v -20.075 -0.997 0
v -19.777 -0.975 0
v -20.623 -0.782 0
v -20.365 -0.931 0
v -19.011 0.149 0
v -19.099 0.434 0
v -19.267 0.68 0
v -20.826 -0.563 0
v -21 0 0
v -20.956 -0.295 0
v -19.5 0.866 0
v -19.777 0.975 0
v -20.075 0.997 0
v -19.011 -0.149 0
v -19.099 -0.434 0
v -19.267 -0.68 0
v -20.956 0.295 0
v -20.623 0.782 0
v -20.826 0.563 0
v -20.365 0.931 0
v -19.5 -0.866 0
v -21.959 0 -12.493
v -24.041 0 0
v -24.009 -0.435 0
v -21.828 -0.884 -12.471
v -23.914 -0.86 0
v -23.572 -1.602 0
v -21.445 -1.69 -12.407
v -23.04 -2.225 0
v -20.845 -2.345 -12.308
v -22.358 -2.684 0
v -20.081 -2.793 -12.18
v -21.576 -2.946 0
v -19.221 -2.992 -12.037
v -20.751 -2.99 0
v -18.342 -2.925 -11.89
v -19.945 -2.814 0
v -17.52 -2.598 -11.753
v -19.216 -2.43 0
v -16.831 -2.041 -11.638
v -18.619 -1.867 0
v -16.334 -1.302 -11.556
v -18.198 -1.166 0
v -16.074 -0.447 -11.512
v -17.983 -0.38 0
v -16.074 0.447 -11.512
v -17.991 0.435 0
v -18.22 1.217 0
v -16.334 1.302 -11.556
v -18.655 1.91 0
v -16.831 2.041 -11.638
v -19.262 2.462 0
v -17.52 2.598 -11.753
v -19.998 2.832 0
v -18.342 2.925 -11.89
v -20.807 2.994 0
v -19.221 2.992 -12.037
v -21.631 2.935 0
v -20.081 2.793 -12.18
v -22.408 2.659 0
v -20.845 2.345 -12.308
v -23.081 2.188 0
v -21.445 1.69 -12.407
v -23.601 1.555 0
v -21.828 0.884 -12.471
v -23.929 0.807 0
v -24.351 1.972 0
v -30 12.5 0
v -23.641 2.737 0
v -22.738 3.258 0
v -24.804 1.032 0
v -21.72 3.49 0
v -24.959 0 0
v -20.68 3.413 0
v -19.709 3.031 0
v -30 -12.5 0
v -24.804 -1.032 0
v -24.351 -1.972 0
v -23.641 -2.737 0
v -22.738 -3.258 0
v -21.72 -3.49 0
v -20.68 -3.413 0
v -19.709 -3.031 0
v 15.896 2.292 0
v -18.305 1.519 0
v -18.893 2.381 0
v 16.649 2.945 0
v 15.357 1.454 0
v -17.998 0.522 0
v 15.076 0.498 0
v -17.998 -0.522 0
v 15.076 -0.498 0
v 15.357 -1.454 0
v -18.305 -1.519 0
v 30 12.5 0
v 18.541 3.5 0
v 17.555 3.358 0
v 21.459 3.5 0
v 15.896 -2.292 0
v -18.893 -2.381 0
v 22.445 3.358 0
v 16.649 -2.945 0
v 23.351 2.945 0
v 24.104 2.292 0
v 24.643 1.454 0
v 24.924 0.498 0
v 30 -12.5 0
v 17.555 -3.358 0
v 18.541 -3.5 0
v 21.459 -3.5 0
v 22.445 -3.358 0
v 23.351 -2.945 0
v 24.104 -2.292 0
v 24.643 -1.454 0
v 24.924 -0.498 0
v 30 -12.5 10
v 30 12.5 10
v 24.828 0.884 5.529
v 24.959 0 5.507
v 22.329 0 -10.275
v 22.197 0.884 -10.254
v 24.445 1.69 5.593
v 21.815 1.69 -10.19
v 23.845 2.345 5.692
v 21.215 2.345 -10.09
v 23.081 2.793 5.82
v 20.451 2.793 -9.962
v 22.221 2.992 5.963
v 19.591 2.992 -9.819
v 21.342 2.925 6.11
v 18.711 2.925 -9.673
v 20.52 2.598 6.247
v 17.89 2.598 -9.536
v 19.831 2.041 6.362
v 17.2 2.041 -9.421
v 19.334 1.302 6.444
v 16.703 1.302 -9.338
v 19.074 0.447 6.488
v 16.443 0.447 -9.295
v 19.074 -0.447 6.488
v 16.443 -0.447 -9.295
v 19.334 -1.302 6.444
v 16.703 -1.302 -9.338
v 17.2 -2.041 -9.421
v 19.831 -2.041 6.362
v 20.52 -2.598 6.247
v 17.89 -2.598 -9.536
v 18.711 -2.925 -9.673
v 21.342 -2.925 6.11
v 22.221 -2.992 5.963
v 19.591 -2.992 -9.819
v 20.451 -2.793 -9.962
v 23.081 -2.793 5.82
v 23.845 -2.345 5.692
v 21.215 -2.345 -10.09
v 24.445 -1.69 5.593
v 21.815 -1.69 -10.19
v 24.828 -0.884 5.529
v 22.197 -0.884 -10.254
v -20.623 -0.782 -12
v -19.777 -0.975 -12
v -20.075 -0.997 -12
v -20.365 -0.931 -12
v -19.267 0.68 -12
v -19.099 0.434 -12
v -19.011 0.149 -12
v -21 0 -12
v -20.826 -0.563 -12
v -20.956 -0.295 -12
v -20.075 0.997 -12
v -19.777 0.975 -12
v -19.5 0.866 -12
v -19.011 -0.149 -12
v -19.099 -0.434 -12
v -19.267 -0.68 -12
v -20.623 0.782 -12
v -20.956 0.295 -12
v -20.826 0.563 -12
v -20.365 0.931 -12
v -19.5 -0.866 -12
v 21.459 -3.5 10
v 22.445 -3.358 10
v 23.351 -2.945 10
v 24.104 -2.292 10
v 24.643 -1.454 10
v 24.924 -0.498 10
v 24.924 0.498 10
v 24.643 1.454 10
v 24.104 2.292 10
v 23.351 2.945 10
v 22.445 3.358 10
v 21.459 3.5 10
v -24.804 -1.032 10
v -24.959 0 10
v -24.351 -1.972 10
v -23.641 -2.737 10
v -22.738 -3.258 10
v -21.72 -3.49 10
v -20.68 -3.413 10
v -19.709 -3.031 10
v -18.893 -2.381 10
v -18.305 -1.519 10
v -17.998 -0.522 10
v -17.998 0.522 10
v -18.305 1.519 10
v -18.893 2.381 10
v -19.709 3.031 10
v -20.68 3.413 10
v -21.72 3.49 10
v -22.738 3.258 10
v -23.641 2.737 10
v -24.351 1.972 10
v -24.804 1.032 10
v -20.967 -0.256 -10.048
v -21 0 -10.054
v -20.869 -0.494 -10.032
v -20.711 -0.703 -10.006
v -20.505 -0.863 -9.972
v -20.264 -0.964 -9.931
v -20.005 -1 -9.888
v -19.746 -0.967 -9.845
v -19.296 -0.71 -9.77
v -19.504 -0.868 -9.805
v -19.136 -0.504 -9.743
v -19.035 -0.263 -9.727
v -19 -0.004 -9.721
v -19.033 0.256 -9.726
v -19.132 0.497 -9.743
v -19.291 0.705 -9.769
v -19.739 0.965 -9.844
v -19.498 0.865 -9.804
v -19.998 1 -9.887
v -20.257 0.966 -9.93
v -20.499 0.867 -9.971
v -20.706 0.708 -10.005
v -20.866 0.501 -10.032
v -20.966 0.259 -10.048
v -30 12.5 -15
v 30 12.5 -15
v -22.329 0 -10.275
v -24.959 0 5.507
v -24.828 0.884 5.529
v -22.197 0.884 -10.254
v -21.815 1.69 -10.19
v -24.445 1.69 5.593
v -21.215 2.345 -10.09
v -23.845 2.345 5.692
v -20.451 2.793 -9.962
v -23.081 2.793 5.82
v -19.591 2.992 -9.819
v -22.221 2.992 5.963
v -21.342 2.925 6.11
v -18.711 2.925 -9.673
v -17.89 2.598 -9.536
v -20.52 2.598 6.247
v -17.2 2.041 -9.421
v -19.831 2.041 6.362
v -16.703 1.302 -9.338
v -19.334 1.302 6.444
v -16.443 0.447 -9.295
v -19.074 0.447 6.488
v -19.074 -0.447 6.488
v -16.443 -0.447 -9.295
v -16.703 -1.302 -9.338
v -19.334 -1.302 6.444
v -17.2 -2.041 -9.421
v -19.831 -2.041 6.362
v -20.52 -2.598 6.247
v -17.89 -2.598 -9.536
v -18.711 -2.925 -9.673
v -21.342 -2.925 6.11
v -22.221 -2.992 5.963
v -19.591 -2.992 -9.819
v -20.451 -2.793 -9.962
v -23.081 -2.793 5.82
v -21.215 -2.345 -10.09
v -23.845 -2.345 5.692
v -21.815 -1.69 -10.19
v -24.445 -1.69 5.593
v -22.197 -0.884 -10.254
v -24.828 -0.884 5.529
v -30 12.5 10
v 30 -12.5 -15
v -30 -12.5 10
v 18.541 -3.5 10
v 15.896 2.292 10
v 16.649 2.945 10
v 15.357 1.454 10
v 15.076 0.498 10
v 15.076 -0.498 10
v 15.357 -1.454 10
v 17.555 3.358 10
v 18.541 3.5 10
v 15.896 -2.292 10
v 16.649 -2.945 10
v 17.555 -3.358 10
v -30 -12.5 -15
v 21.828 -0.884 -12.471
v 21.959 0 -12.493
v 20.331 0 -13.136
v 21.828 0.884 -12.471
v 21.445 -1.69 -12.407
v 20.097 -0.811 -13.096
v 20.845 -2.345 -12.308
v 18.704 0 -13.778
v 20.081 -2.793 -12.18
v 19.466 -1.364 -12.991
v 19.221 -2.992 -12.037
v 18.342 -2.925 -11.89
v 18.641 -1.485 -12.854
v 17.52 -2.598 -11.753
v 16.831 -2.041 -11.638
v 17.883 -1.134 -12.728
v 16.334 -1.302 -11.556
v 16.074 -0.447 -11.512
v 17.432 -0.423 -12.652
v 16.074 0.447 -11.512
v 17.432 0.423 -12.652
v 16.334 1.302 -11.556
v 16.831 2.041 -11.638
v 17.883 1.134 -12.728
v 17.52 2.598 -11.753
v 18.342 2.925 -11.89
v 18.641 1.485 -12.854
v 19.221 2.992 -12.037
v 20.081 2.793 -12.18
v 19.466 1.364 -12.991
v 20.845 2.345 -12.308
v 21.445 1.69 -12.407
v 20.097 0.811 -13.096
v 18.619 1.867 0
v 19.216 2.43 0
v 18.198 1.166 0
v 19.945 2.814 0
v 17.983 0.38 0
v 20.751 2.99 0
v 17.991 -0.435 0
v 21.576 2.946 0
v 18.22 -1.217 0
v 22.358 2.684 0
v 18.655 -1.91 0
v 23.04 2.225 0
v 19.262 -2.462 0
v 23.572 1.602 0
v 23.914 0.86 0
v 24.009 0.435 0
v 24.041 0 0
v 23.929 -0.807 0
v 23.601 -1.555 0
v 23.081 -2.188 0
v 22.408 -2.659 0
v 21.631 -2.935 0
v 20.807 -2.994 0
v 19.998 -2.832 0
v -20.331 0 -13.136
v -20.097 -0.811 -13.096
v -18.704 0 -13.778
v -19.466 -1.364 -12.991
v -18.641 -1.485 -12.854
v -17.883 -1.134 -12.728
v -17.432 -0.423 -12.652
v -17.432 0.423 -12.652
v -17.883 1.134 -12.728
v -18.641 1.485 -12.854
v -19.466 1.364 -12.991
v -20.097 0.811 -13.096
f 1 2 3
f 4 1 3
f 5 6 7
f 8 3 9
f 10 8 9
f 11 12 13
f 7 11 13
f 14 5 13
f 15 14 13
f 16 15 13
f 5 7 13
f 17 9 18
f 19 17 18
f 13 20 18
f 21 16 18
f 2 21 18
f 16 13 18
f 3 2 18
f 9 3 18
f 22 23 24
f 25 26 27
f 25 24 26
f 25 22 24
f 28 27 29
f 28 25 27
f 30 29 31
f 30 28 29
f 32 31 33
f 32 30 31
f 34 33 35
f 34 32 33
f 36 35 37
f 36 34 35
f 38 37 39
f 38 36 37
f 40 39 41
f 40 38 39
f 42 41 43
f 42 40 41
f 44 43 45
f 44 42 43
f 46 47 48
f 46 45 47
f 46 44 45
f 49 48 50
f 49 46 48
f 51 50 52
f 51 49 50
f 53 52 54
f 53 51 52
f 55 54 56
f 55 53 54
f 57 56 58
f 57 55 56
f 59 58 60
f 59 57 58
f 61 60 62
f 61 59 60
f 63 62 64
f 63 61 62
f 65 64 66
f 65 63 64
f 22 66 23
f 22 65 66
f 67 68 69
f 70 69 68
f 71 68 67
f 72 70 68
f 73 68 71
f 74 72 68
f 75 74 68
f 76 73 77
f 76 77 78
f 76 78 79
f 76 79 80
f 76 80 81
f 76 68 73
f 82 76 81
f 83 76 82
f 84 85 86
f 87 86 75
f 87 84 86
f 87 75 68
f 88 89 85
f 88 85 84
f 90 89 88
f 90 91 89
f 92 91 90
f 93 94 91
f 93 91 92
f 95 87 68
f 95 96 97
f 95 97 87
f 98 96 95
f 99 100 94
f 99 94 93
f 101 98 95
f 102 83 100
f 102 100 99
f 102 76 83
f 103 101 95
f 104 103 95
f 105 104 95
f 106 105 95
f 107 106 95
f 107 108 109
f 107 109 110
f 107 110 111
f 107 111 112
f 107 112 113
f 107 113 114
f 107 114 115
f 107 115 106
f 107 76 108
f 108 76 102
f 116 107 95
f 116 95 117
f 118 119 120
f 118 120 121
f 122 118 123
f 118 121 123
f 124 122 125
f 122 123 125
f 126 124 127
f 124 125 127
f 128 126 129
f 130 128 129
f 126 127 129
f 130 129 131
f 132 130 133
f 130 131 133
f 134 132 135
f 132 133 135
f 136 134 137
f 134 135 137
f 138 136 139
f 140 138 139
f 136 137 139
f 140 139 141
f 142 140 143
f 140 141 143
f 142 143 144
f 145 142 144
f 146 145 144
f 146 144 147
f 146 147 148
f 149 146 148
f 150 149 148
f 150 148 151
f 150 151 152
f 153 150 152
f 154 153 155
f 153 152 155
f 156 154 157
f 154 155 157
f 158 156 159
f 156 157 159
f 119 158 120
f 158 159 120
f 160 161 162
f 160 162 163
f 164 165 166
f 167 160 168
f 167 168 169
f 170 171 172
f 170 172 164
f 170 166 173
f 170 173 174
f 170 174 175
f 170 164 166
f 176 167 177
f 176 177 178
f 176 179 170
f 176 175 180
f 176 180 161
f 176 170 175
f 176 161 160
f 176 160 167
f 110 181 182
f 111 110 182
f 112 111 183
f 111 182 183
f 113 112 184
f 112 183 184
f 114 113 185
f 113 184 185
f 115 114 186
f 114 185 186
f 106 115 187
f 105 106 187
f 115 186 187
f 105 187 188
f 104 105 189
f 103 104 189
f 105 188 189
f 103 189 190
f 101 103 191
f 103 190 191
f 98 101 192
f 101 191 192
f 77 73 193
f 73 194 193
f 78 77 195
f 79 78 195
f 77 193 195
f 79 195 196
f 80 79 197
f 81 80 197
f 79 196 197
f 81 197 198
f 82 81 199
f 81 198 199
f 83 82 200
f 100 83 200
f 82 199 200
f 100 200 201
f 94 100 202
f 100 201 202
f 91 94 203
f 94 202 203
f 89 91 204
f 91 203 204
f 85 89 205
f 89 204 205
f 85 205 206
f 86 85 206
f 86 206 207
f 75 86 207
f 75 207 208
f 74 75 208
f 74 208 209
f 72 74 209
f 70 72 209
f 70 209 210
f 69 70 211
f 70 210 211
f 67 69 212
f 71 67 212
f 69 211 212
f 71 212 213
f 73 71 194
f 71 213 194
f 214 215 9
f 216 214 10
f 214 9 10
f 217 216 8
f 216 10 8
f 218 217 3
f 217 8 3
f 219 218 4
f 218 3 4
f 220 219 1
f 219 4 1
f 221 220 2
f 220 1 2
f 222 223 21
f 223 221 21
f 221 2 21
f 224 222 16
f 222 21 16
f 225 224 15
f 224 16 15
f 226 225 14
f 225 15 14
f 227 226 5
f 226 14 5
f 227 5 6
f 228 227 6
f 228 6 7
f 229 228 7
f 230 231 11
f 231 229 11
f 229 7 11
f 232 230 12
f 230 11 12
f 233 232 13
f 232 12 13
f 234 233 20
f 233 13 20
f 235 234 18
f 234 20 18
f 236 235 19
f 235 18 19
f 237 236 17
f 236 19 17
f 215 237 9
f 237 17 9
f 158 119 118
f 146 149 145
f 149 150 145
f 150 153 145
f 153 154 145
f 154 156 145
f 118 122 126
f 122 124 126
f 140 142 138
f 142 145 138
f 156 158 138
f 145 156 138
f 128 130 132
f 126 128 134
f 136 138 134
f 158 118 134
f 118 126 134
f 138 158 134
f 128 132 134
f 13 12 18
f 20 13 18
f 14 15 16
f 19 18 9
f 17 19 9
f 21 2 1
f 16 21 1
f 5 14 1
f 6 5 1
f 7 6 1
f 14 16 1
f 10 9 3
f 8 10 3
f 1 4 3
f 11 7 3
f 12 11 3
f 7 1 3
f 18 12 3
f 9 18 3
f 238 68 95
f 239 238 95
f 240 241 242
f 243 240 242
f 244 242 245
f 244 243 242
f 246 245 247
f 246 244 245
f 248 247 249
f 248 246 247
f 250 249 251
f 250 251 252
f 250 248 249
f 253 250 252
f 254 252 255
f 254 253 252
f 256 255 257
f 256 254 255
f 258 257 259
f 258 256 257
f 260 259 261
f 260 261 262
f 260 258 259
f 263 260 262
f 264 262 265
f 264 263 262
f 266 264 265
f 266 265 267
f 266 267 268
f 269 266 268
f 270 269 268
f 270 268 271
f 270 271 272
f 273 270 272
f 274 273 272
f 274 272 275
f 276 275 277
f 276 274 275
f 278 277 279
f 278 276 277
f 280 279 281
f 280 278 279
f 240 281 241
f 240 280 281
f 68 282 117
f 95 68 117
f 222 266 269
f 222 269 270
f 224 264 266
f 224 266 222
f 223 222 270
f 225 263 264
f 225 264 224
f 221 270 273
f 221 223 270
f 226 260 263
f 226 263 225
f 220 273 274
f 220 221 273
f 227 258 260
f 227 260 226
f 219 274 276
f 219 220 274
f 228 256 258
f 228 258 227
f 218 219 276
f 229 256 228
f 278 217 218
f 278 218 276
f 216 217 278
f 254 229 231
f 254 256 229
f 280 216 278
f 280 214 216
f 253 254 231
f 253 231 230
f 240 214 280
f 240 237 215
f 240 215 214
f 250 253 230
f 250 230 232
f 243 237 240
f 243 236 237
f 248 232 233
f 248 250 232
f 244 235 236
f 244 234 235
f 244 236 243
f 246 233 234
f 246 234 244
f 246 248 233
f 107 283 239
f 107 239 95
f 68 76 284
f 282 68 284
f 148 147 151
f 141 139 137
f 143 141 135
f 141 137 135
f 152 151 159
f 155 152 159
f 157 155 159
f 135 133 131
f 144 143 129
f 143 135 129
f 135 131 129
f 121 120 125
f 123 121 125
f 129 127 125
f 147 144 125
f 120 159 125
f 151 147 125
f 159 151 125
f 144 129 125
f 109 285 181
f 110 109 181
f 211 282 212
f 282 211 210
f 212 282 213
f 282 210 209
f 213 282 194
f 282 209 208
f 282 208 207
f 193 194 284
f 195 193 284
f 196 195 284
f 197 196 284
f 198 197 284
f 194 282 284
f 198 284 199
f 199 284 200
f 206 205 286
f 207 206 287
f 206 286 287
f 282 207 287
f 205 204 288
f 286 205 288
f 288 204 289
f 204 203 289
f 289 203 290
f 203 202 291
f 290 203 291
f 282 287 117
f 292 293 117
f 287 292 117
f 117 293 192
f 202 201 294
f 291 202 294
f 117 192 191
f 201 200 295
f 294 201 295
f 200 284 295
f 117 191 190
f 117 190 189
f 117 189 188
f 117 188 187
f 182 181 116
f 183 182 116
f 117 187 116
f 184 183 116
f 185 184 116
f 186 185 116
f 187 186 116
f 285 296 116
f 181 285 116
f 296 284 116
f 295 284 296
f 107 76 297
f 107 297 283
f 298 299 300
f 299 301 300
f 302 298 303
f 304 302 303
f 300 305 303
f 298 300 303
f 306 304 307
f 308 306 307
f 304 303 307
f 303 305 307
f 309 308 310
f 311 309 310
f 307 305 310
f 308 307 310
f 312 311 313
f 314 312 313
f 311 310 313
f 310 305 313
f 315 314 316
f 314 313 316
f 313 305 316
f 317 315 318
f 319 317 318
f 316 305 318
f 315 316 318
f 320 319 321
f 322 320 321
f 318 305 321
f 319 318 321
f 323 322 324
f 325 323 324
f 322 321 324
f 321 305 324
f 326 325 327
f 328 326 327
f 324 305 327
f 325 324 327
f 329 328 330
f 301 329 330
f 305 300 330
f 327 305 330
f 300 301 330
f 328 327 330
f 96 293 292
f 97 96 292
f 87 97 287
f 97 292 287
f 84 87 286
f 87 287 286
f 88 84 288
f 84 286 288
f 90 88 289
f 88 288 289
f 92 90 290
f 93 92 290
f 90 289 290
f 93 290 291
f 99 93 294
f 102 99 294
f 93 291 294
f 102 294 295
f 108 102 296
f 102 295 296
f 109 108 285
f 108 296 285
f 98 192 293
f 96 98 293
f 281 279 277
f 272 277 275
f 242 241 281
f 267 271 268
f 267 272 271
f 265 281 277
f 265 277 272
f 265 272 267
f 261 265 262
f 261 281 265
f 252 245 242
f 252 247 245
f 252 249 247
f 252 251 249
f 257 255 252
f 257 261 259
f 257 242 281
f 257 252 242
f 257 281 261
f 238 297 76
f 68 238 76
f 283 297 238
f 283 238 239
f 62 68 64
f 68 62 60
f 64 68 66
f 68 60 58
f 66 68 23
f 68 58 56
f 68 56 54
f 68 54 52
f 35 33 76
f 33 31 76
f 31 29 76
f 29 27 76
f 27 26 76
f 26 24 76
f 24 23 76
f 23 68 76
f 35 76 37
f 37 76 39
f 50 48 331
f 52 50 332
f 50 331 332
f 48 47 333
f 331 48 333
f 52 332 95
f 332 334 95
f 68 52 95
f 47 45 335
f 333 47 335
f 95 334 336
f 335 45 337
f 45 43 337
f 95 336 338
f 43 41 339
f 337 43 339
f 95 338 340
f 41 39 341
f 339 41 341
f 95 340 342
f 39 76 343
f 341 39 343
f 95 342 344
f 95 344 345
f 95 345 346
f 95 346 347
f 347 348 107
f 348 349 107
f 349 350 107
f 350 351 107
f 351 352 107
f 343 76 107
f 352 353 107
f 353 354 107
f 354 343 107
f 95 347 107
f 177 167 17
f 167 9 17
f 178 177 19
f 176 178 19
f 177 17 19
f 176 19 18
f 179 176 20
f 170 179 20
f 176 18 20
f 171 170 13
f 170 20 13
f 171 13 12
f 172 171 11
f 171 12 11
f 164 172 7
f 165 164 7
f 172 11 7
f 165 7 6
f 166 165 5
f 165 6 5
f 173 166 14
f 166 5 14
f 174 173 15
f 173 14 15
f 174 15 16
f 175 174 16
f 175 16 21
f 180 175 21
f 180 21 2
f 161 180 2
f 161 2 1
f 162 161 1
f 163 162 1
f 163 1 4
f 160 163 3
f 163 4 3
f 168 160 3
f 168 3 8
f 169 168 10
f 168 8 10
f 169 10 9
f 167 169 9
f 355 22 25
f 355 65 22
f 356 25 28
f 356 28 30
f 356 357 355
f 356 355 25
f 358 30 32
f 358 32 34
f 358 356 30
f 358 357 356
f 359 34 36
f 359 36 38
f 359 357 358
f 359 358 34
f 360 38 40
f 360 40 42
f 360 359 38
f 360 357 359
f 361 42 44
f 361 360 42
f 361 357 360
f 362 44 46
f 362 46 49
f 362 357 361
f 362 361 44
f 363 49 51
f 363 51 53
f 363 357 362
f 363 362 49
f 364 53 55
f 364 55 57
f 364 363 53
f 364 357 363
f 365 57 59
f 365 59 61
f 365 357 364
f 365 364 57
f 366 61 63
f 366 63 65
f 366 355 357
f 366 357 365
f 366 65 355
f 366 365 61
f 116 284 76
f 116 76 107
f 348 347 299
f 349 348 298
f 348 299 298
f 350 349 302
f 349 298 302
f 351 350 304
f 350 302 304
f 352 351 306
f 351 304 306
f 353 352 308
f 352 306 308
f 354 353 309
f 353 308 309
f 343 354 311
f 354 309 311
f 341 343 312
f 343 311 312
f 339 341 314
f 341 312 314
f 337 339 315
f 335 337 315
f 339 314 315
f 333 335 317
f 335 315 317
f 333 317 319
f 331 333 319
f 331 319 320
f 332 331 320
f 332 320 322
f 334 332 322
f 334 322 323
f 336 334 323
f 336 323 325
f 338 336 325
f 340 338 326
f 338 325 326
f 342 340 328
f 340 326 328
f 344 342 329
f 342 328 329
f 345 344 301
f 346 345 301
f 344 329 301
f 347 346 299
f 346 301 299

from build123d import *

# Parameters (mm, degrees)
F0_W      = 60
F0_H      = 15
F1_DEPTH  = 12.5
F4_W      = 1
F4_H      = 12
F6_W      = 60
F6_H      = 10
F7_DEPTH  = 12.5
F8_W      = 3.5002815183
F8_H      = 10
F11_DEPTH = 25
F14_W     = 1
F14_H     = 12


# Not quite as in the source:
# - a pattern or mirror of a feature is missing from the dataset's text; its kind, count and spacing are read off the source's solid


with BuildPart() as f1:
    # F0 (on Front) → F1 (new body, symmetric)
    with BuildSketch(Plane.XZ):
        with Locations((0, -7.5)):
            Rectangle(F0_W, F0_H)
    extrude(amount=F1_DEPTH, both=True)

    # F2 (on Front) → F3 (revolve, cut)
    with BuildSketch(Plane.XZ):
        Polygon((-21.9591817715, -12.4931969619), (-18.7036573682, -13.778055791), (-22, 6), (-24.9591817715, 5.5068030381), align=None)
    f3 = revolve(axis=Axis((-20.3518286841, 0, -3.8890278955), (-0.1643989873, 0, 0.9863939238)), mode=Mode.SUBTRACT)

    # F3_copies: F3 across plane
    add(f3.mirror(Plane(origin=(0, 0, 0), x_dir=(0, 0, 1), z_dir=(1, 0, 0))), mode=Mode.SUBTRACT)


with BuildPart() as f5:
    # F4 (on Front) → F5 (revolve)
    with BuildSketch(Plane.XZ):
        with Locations((-20.5, -6)):
            Rectangle(F4_W, F4_H)
    revolve(axis=Axis((-20, 0, -6), (0, 0, -1)))


with BuildPart() as f7:
    # F6 (on Front) → F7 (new body, symmetric)
    with BuildSketch(Plane.XZ):
        with Locations((0, 5)):
            Rectangle(F6_W, F6_H)
    extrude(amount=F7_DEPTH, both=True)

    # F8 (on Front) → F9 (revolve, cut)
    with BuildSketch(Plane.XZ):
        with Locations((-23.2090410123, 5)):
            Rectangle(F8_W, F8_H)
    revolve(axis=Axis((-21.4589002532, 0, 5), (0, 0, 1)), mode=Mode.SUBTRACT)

    # F10 (on face) → F11 (cut)
    with BuildSketch(Plane.XY.offset(10)):
        with BuildLine():
            Line((21.4589002532, 3.5002815183), (18.5410997468, 3.5002815183))
            ThreePointArc((18.5410997468, 3.5002815183), (15.0408182285, 0), (18.5410997468, -3.5002815183))
            Line((18.5410997468, -3.5002815183), (21.4589002532, -3.5002815183))
            ThreePointArc((21.4589002532, -3.5002815183), (24.9591817715, 0), (21.4589002532, 3.5002815183))
        make_face()
    extrude(amount=-F11_DEPTH, mode=Mode.SUBTRACT)


with BuildPart() as f13:
    # F12 (on Front) → F13 (revolve)
    with BuildSketch(Plane.XZ):
        Polygon((-24.9591817715, 5.5068030381), (-22.3287979746, -10.2754997432), (-19.3696162031, -9.7823027813), (-22, 6), align=None)
    revolve(axis=Axis((-20.6848081016, 0, -1.8911513907), (0.1643989873, 0, -0.9863939238)))


with BuildPart() as f13_copies_1:
    # F13_copies: instance of F13
    add(f13.part.mirror(Plane(origin=(0, 0, 0), x_dir=(0, 0, 1), z_dir=(1, 0, 0))))


with BuildPart() as f13_1:
    add(f13.part)

    # F14 (on Front) → F15 (revolve, cut)
    with BuildSketch(Plane.XZ):
        with Locations((-20.5, -6)):
            Rectangle(F14_W, F14_H)
    revolve(axis=Axis((-20, 0, -6), (0, 0, 1)), mode=Mode.SUBTRACT)


solid = Compound([f1.part, f5.part, f7.part, f13_copies_1.part, f13_1.part])
